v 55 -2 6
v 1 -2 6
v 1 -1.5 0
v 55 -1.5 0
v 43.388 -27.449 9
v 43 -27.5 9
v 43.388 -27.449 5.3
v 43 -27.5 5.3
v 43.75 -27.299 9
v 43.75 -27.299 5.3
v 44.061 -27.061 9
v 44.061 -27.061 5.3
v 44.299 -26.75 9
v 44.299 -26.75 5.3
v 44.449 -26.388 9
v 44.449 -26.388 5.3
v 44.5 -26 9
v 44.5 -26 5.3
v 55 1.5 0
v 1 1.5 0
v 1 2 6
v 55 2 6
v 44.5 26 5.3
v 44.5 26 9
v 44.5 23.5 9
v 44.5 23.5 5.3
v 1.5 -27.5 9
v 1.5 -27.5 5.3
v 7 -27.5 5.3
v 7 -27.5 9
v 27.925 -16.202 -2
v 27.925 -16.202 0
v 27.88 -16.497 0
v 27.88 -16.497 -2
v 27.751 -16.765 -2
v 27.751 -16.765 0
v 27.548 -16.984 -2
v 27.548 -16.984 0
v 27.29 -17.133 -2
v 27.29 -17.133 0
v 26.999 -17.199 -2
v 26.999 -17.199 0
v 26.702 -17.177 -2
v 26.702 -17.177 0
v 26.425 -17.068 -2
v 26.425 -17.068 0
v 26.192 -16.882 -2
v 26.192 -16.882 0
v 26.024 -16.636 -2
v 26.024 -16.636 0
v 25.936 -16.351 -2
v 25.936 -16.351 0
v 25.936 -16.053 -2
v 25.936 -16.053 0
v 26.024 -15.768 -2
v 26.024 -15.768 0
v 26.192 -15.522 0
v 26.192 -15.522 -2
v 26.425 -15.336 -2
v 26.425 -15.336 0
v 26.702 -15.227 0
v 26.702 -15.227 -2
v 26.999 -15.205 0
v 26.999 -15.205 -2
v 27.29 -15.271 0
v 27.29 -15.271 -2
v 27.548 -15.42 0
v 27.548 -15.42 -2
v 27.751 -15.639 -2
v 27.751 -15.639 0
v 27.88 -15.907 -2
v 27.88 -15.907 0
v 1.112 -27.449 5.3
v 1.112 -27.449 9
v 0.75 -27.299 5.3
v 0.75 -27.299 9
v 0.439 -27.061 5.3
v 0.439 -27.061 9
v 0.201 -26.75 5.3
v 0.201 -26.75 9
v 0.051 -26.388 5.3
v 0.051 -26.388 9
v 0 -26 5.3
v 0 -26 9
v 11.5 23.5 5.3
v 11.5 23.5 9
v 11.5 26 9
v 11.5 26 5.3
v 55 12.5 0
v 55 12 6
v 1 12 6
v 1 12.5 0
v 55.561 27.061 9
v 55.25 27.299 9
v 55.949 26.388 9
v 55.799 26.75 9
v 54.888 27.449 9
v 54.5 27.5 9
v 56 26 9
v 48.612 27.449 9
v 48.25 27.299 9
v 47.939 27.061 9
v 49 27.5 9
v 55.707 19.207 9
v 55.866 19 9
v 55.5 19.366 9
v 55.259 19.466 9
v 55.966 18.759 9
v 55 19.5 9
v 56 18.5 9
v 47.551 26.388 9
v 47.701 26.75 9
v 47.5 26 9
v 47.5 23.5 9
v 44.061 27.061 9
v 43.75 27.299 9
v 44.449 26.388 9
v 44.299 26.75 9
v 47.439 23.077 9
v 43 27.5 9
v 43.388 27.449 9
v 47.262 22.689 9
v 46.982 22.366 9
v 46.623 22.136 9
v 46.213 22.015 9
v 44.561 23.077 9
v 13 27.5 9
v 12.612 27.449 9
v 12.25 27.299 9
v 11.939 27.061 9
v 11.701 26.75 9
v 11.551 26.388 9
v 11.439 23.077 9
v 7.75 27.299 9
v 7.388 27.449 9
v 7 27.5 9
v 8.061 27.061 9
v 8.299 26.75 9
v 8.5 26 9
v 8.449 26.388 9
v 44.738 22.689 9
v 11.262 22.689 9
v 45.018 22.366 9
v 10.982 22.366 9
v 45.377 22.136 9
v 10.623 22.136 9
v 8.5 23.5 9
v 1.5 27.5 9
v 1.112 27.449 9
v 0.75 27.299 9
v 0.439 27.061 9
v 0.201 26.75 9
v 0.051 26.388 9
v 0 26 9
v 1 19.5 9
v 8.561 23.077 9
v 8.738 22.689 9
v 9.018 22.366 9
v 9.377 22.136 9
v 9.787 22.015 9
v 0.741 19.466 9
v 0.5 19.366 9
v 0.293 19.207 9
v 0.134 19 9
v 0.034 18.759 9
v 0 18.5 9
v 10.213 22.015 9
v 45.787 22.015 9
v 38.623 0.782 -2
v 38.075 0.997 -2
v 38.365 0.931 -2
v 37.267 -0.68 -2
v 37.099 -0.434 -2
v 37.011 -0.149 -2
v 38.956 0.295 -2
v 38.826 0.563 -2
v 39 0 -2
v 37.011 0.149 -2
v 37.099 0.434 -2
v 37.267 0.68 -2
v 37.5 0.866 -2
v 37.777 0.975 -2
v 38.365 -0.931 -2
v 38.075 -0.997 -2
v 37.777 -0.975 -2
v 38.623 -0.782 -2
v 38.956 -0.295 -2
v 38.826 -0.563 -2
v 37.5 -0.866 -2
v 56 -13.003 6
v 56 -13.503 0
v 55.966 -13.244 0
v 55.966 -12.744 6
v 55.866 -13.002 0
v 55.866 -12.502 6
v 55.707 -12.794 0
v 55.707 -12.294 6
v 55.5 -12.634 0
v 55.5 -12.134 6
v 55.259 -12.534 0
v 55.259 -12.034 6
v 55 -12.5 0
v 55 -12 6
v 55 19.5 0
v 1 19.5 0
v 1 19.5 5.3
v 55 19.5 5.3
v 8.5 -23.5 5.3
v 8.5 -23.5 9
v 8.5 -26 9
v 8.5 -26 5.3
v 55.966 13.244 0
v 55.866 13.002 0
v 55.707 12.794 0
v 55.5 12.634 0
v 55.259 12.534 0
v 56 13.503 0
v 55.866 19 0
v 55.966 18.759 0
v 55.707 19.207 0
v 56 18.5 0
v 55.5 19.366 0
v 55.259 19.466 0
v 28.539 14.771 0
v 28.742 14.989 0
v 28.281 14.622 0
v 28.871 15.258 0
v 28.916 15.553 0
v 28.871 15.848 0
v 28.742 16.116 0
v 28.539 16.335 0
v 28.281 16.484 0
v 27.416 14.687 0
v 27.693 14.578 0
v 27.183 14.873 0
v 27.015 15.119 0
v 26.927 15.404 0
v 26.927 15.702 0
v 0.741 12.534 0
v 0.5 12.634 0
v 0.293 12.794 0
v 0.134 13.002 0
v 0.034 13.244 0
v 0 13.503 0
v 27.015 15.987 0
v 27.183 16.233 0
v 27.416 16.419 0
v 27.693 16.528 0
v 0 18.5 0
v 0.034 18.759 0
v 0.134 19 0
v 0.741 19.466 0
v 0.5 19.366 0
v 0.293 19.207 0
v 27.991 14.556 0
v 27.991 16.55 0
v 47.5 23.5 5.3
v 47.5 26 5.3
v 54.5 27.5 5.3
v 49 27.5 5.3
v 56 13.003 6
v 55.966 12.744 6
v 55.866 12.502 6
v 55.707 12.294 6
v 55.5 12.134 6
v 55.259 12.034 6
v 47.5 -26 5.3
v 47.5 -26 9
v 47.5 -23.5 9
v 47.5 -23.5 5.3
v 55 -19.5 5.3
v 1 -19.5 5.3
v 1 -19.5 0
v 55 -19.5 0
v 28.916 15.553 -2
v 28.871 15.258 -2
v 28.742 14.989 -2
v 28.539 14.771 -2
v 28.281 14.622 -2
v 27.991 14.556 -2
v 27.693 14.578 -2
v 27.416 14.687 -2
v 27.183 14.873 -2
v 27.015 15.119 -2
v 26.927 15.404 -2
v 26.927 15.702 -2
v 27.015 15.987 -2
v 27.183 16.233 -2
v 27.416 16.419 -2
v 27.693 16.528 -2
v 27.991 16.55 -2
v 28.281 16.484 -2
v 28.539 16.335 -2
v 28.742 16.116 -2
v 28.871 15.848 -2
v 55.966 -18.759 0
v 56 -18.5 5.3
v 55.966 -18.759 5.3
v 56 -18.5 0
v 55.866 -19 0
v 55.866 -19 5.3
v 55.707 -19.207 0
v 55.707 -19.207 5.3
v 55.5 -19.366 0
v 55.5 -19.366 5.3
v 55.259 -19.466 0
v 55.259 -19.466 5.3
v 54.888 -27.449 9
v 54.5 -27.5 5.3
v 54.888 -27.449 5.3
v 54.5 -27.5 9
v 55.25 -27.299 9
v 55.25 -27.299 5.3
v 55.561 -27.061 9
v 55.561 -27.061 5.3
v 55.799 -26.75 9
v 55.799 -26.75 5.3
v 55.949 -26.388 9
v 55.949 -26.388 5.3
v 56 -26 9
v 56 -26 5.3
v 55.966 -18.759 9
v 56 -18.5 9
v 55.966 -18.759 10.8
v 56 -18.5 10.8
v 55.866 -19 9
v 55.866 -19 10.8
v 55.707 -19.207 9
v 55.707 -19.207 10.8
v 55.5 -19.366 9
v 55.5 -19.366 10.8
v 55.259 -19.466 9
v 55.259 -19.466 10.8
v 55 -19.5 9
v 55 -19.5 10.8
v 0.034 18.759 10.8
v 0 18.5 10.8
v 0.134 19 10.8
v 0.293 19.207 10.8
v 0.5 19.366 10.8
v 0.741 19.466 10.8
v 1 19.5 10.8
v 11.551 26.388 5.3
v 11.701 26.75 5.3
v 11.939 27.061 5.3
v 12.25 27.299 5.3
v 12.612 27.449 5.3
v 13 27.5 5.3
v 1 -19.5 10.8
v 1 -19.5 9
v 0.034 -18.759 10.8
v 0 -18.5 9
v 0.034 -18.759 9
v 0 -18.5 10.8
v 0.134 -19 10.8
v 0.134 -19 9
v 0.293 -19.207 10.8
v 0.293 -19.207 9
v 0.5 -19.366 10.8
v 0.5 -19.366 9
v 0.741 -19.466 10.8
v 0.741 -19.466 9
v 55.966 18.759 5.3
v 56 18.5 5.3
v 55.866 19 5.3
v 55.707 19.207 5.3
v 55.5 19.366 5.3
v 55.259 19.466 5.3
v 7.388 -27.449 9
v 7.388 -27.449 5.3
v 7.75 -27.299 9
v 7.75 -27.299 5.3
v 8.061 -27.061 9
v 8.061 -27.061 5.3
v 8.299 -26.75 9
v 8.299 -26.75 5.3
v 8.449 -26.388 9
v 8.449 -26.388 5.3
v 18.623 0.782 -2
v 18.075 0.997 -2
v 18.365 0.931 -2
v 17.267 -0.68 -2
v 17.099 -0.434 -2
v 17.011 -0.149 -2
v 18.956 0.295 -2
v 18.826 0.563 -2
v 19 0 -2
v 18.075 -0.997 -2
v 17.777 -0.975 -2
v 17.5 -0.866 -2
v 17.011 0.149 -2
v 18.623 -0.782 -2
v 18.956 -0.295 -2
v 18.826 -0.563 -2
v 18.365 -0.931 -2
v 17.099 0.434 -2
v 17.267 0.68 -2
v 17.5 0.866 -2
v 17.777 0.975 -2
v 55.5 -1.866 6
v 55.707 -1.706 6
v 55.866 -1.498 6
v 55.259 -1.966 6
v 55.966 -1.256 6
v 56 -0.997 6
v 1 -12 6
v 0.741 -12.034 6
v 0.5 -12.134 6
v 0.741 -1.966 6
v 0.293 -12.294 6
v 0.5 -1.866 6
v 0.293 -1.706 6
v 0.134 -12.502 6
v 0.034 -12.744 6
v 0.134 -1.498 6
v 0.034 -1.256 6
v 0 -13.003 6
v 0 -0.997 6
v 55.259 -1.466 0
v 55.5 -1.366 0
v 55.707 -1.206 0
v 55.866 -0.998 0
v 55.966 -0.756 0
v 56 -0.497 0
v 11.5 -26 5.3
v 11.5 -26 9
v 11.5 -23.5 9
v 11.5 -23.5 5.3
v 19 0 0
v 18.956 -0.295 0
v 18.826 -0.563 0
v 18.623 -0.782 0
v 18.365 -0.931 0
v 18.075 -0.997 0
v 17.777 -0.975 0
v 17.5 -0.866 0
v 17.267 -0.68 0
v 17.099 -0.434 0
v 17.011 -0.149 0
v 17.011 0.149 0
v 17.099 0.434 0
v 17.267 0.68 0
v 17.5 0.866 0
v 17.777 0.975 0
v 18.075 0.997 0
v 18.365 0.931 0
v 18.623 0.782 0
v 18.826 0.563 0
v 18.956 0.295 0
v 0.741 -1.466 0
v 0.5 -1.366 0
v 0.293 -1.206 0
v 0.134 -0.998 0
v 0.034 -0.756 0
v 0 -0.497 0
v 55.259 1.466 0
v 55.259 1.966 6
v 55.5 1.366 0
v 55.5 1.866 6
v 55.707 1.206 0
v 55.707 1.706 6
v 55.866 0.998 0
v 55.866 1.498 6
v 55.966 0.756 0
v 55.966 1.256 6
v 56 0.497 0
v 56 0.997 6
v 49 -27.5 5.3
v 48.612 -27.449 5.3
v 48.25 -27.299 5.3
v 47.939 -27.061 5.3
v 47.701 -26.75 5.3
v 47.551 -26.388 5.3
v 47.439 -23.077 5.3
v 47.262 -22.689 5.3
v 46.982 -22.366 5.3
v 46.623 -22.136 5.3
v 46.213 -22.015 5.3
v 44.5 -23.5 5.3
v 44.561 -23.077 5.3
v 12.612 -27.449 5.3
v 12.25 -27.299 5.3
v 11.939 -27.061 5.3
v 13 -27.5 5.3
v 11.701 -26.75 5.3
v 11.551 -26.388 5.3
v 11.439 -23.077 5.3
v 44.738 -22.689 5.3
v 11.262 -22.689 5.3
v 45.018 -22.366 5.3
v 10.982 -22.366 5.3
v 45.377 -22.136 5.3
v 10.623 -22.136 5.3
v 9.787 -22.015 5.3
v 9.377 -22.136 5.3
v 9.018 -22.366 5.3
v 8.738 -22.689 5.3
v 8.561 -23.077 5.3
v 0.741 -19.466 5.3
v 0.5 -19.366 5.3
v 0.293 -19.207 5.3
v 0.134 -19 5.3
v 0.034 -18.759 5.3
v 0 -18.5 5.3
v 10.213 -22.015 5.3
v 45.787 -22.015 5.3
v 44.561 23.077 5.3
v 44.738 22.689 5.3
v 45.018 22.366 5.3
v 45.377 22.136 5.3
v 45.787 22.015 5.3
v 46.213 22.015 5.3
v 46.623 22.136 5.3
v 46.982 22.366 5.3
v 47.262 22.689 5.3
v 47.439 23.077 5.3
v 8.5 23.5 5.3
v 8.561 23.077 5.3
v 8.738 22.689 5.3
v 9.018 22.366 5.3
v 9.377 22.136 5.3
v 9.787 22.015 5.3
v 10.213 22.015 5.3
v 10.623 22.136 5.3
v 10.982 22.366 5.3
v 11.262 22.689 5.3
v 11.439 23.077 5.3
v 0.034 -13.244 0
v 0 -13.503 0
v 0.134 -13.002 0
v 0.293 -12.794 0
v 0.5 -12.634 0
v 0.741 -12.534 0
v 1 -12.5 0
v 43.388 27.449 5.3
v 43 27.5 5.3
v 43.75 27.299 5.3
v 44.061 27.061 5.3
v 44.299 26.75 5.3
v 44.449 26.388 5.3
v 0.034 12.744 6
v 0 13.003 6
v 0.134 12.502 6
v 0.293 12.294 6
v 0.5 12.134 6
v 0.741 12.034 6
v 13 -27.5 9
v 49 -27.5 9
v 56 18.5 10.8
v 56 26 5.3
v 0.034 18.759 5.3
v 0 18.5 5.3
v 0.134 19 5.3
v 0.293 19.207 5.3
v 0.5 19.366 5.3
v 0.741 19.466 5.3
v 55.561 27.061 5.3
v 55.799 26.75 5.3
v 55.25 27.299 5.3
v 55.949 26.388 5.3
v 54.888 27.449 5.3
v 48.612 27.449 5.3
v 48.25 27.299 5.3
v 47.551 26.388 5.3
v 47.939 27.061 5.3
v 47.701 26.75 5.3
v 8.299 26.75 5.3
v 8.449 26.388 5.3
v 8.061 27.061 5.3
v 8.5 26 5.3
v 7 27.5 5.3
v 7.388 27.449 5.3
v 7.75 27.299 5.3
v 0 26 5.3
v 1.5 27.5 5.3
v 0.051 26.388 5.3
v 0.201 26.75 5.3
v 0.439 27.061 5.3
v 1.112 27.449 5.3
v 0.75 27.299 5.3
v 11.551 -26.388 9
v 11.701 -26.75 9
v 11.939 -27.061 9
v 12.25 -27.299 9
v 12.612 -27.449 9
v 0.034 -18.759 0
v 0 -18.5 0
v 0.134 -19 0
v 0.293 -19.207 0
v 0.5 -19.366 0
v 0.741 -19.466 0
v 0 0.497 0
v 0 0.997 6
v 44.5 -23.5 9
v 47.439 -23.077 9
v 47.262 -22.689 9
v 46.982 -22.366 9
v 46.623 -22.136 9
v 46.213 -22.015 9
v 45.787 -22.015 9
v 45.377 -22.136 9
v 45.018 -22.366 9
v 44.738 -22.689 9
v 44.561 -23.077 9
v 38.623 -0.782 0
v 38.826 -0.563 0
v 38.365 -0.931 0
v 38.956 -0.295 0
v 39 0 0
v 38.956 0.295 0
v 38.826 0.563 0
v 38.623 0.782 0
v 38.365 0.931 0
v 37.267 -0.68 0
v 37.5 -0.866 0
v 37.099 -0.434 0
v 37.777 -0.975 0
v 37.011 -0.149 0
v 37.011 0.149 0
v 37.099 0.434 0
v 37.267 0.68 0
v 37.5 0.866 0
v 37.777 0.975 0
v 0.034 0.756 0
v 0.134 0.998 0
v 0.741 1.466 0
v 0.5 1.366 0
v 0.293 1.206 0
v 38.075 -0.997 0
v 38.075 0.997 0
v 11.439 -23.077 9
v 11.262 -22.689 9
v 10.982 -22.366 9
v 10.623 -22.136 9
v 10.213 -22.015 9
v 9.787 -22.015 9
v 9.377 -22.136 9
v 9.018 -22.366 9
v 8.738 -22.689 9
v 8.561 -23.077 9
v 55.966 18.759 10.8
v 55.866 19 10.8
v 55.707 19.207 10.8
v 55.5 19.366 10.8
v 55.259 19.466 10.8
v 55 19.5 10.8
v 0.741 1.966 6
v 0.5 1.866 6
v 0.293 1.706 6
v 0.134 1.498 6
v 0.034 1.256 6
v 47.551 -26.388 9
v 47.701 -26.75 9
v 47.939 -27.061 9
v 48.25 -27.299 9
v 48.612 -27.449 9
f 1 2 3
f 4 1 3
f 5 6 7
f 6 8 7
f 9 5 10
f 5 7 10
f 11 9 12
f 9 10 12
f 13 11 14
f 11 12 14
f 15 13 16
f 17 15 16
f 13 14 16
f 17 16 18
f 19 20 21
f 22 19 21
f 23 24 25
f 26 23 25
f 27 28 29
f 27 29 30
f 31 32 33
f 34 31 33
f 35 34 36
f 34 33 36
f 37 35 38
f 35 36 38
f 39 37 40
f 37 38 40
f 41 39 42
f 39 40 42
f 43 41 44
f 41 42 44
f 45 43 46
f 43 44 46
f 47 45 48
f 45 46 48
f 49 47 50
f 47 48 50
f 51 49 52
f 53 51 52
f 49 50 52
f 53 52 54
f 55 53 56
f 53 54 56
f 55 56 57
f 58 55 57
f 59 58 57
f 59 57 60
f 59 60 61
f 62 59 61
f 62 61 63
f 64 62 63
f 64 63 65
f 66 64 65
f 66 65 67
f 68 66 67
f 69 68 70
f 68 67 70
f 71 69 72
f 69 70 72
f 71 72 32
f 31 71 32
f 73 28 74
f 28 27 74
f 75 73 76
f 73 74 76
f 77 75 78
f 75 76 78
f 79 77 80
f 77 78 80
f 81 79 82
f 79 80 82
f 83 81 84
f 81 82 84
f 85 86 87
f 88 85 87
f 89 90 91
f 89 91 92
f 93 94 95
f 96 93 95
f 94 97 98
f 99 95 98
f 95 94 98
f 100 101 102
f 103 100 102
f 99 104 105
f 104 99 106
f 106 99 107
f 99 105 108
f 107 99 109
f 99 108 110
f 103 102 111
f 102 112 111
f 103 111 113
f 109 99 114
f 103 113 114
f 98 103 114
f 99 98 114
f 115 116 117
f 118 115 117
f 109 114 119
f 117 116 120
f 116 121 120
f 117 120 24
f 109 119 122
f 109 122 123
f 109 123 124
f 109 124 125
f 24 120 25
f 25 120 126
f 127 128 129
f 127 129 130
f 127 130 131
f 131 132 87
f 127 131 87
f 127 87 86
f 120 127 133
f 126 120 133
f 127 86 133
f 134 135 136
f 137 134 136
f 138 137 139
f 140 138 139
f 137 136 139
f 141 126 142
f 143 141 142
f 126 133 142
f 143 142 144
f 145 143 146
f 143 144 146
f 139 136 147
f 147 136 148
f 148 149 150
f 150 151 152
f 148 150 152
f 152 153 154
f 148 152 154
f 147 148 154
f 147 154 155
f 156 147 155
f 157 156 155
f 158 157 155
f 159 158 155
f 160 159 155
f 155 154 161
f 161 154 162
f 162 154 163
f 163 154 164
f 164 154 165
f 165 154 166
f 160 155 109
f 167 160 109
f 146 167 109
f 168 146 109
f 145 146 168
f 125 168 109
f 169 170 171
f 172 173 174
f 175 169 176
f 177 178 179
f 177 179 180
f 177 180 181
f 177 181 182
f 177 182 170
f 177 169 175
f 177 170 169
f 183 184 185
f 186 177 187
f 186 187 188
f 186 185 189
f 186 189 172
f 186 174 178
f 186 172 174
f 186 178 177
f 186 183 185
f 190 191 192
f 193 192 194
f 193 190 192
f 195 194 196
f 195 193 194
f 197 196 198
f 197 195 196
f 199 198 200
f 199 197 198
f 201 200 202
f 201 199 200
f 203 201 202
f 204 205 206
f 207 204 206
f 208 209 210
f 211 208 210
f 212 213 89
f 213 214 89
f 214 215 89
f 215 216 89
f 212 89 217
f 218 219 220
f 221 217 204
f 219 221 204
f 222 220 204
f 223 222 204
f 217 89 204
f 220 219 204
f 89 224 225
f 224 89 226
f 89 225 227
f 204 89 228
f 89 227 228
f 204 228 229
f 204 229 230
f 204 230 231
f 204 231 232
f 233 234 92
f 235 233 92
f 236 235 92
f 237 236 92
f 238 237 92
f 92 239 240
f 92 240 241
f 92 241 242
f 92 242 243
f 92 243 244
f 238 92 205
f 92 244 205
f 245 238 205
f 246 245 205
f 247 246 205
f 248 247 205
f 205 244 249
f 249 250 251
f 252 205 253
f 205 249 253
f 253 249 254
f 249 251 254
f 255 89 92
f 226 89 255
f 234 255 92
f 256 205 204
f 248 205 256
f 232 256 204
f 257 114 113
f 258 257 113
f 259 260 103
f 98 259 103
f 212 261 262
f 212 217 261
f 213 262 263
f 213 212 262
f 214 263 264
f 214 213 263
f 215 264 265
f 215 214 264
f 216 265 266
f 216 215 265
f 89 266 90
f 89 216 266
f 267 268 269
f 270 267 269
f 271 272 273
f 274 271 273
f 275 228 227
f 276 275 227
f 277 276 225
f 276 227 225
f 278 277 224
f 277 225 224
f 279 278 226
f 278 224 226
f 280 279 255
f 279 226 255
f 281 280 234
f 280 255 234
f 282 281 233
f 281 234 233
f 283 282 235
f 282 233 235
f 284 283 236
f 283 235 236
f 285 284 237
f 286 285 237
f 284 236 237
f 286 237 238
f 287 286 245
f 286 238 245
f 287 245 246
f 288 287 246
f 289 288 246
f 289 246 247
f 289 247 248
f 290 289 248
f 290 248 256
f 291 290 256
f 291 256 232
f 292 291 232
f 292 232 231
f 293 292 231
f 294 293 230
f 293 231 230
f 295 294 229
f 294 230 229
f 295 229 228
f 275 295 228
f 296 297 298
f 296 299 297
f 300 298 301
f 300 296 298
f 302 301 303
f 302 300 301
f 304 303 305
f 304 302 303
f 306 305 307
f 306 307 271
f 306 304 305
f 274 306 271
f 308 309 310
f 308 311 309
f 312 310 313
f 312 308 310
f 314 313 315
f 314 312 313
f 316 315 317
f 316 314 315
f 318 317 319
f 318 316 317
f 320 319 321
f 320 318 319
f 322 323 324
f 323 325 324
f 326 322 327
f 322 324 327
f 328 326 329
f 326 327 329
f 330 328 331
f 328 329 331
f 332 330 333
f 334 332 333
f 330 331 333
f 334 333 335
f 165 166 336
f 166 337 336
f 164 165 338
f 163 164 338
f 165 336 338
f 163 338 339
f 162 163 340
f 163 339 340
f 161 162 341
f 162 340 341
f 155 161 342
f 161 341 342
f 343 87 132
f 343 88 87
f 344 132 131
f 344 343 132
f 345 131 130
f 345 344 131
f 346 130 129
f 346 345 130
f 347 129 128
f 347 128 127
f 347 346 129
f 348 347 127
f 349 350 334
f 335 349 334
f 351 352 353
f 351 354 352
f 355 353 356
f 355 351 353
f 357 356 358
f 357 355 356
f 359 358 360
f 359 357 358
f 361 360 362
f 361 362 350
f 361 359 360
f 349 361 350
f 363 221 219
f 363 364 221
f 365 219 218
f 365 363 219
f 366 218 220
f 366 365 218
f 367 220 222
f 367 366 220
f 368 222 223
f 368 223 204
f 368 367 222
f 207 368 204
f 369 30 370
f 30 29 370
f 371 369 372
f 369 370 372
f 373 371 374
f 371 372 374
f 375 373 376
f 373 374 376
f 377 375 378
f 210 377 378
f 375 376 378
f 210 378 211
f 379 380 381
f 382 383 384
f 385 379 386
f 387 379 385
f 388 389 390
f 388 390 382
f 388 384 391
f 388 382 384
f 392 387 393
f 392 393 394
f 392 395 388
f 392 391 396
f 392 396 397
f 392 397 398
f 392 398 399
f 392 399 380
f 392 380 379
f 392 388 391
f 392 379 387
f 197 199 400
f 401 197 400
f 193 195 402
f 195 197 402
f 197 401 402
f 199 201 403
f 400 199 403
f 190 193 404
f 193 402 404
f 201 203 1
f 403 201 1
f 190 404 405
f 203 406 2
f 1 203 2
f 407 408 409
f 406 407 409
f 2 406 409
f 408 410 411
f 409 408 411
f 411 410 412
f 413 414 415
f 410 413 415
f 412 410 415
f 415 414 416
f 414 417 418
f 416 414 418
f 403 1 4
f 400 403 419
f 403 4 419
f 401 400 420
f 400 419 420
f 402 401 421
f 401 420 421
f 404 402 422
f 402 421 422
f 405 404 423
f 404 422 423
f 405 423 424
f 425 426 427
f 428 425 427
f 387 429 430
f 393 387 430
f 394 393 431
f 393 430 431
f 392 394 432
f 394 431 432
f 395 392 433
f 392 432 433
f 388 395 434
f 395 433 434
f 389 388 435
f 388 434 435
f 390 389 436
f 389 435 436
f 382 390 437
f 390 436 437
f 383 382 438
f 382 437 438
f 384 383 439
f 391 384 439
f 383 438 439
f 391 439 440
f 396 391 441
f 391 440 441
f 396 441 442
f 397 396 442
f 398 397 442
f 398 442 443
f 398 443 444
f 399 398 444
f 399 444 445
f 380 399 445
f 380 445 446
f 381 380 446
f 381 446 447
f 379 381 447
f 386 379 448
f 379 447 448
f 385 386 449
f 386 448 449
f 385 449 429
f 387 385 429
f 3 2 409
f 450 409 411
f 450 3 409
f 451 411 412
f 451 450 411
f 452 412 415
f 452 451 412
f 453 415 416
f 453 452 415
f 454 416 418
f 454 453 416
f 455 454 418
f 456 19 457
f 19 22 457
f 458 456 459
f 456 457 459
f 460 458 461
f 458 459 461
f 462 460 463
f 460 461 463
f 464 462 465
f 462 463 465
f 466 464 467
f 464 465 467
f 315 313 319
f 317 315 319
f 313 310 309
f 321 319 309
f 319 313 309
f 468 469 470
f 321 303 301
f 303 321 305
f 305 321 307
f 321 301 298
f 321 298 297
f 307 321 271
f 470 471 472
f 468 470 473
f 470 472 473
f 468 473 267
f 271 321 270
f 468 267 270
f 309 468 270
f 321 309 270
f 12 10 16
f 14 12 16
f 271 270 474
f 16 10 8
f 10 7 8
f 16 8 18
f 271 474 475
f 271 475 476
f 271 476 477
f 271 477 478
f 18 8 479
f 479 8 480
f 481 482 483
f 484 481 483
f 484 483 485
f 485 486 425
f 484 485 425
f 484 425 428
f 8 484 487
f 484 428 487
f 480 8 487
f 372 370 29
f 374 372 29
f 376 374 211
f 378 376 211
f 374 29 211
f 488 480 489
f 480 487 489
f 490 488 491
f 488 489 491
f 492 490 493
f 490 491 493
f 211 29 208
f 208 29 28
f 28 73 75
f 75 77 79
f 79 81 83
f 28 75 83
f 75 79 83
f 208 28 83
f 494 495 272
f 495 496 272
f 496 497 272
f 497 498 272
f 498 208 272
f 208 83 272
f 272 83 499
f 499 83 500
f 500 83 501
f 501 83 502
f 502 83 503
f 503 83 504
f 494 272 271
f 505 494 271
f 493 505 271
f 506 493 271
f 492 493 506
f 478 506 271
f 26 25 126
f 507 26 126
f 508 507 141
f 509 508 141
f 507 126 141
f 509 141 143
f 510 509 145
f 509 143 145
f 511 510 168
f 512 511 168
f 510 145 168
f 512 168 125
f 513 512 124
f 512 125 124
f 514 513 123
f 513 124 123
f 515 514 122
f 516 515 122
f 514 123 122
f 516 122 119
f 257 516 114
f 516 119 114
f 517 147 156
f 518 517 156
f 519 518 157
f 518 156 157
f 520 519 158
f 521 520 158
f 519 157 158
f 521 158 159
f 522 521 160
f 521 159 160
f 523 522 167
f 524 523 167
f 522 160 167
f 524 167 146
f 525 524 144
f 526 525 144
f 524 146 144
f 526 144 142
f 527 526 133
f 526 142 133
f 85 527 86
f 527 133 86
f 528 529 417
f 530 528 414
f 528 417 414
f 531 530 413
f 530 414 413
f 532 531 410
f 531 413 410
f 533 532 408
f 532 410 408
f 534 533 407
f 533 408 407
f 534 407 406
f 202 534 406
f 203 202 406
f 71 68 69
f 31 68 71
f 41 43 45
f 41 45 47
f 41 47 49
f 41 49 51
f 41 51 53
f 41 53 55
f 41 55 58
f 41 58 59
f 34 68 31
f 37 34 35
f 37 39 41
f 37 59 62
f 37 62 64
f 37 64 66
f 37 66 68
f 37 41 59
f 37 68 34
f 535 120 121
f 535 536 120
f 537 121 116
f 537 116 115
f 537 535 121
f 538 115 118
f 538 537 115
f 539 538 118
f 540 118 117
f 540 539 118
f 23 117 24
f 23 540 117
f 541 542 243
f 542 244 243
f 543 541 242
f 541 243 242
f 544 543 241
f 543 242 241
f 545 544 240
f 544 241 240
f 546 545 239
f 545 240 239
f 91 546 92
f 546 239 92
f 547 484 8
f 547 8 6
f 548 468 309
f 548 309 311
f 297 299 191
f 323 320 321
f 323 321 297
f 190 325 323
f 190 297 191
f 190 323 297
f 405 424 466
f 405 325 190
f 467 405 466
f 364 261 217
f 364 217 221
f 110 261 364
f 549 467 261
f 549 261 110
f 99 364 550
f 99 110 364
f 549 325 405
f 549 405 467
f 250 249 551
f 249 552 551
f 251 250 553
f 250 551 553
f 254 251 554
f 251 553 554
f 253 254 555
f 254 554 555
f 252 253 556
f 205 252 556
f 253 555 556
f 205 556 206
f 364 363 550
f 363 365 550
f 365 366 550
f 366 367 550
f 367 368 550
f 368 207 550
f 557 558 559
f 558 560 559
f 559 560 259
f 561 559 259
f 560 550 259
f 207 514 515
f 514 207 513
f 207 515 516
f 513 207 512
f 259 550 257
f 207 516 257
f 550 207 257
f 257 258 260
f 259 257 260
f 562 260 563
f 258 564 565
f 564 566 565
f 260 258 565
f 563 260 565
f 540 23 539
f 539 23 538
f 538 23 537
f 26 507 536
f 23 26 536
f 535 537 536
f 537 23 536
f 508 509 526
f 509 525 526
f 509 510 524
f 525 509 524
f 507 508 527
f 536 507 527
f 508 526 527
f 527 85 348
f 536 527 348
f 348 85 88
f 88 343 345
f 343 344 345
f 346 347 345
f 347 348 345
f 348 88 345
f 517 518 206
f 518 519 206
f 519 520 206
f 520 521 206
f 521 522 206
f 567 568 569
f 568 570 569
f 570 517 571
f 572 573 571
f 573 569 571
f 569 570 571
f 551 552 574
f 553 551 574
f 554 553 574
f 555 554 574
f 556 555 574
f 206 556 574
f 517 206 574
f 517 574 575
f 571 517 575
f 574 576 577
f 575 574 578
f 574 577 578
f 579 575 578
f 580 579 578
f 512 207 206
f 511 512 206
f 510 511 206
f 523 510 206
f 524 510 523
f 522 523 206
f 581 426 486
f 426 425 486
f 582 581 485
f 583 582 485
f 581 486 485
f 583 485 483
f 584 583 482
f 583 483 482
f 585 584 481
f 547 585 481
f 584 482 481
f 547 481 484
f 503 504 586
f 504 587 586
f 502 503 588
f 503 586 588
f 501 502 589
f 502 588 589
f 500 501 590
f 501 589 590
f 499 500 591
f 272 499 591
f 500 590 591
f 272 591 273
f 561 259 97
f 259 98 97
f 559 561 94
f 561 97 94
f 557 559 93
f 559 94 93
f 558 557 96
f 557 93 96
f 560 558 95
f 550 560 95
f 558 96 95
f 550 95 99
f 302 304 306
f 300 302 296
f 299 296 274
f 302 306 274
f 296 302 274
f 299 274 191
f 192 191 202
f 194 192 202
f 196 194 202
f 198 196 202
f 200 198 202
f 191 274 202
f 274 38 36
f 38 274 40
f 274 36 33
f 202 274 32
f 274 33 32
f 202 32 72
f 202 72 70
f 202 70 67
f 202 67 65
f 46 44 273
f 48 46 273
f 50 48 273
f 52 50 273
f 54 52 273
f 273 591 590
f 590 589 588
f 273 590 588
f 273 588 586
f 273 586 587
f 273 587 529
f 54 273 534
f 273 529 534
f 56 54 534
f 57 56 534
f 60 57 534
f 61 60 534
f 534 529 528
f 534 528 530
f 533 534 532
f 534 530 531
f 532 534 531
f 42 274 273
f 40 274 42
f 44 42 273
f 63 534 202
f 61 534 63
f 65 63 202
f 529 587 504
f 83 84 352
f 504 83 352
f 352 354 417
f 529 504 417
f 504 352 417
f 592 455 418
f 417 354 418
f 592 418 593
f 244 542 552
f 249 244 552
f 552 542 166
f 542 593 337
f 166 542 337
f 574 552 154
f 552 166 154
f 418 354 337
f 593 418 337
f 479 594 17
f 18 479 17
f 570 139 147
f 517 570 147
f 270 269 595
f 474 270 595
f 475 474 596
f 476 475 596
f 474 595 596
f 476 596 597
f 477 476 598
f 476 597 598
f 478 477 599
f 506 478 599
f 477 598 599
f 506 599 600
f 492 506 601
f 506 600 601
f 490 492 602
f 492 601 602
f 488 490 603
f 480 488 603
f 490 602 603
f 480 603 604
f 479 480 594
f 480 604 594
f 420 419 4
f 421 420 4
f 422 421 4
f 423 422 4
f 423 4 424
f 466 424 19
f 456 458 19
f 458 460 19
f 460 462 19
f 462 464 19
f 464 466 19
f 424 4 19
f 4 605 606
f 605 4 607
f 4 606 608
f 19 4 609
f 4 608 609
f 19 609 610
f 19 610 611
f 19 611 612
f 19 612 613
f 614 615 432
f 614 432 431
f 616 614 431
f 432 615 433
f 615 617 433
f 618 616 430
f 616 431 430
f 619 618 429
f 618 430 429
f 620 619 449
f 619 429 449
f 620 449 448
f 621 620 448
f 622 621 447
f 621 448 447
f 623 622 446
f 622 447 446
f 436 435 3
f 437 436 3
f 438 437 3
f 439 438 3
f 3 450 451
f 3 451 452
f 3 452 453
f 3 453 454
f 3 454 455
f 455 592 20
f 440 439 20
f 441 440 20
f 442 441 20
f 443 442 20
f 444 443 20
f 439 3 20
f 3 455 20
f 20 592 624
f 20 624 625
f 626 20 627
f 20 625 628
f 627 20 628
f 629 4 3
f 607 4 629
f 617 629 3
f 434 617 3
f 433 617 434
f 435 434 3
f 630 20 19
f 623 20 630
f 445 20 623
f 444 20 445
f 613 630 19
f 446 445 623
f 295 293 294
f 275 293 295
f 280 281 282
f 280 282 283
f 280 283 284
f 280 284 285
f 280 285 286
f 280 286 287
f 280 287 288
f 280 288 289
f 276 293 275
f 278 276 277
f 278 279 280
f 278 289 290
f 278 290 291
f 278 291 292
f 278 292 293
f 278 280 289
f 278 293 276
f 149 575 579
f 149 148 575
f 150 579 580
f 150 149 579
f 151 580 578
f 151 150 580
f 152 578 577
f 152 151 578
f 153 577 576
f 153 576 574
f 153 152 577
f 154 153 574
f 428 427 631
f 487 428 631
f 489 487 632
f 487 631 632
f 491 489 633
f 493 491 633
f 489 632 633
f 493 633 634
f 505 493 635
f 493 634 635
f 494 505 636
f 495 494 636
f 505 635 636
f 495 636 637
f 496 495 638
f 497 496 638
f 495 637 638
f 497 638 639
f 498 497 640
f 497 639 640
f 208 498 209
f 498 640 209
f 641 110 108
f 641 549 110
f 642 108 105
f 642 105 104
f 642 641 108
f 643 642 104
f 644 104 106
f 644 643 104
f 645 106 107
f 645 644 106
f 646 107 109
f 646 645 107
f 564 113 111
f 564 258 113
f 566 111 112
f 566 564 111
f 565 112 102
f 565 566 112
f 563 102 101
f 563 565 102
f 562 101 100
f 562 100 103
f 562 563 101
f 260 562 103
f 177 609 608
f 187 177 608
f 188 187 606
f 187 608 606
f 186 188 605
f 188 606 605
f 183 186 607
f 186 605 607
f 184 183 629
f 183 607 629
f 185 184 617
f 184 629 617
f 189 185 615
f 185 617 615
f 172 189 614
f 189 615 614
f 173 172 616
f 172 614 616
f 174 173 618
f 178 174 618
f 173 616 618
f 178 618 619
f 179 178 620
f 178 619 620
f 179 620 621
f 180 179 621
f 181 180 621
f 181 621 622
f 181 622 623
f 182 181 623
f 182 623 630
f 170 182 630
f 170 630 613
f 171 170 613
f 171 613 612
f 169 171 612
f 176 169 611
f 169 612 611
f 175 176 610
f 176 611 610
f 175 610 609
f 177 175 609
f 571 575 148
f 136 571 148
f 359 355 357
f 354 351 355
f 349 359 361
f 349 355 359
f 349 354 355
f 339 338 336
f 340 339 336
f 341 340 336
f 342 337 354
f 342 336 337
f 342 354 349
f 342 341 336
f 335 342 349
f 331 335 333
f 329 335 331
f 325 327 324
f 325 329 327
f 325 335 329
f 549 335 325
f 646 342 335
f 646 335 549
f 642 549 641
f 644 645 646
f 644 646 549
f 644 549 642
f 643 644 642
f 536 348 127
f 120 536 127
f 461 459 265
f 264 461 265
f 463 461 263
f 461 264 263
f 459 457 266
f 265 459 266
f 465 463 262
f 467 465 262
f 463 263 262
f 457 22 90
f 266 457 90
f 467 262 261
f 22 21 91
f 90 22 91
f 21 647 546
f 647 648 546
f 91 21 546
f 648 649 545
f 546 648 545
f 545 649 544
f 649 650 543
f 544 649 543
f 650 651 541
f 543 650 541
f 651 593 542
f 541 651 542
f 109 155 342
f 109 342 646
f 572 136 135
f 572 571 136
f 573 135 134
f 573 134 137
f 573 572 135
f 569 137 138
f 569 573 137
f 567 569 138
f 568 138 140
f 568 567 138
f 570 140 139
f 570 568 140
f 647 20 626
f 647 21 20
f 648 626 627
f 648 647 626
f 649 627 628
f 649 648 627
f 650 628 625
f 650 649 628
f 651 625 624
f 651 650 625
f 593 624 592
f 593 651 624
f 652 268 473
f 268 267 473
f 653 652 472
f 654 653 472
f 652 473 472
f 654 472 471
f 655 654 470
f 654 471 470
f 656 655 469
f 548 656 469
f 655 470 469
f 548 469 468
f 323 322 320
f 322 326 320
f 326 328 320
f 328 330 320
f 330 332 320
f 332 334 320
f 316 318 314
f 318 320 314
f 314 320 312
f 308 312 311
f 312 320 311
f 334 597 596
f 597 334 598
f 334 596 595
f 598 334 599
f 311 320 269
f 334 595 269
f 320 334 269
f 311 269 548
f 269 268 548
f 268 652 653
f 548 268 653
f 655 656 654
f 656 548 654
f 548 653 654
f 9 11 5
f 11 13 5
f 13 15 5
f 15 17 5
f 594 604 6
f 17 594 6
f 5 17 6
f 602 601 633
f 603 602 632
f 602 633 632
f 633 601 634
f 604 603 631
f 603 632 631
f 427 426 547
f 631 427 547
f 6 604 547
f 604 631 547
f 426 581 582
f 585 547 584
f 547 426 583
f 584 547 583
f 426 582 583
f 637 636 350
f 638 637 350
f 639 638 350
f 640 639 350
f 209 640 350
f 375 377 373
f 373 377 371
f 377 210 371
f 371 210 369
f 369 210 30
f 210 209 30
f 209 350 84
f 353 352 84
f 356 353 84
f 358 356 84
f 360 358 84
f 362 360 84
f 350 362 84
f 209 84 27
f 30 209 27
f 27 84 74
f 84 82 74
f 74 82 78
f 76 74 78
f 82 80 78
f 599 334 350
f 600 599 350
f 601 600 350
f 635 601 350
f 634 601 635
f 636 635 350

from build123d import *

# Parameters (mm, degrees)
F0_W     = 8
F0_H     = 3.7
F1_DEPTH = 56
F3_W     = 56
F3_H     = 39
F4_DEPTH = 1.8
F5_DEPTH = 25
F6_R     = 1
F7_R     = 1.5
F8_R     = 1
F9_DEPTH = 2


with BuildPart() as f1:
    # F0 (on Right) → F1 (new body)
    with BuildSketch(Plane.YZ):
        Polygon((-1.5, 0), (0, 0), (0, 9), (-19.5, 9), (-19.5, 5.3), (-19.5, 0), (-12.5, 0), (-12, 6), (-2, 6), align=None)
        with Locations((-23.5, 7.15)):
            Rectangle(F0_W, F0_H)
        Polygon((0, 9), (0, 0), (1.5, 0), (2, 6), (12, 6), (12.5, 0), (19.5, 0), (19.5, 5.3), (19.5, 9), align=None)
        with Locations((23.5, 7.15)):
            Rectangle(F0_W, F0_H)
    extrude(amount=F1_DEPTH)

    # F3 (on face) → F4 (join)
    with BuildSketch(Plane.XY.offset(9)):
        with Locations((28, 0)):
            Rectangle(F3_W, F3_H)
    extrude(amount=F4_DEPTH)

    # F2 (on face) → F5 (cut)
    with BuildSketch(Plane.XY.offset(9)):
        with BuildLine():
            Line((11.5, -27.5), (11.5, -23.5))
            ThreePointArc((11.5, -23.5), (10, -25), (8.5, -23.5))
            Line((8.5, -23.5), (8.5, -27.5))
            Line((8.5, -27.5), (11.5, -27.5))
        make_face()
        with BuildLine():
            ThreePointArc((8.5, -23.5), (10, -25), (11.5, -23.5))
            ThreePointArc((11.5, -23.5), (10, -22), (8.5, -23.5))
        make_face()
        with BuildLine():
            Line((44.5, -23.5), (44.5, -27.5))
            Line((44.5, -27.5), (47.5, -27.5))
            Line((47.5, -27.5), (47.5, -23.5))
            ThreePointArc((47.5, -23.5), (46, -25), (44.5, -23.5))
        make_face()
        with BuildLine():
            ThreePointArc((47.5, -23.5), (46, -22), (44.5, -23.5))
            ThreePointArc((44.5, -23.5), (46, -25), (47.5, -23.5))
        make_face()
        with BuildLine():
            Line((11.5, 27.5), (8.5, 27.5))
            Line((8.5, 27.5), (8.5, 23.5))
            ThreePointArc((8.5, 23.5), (10, 25), (11.5, 23.5))
            Line((11.5, 23.5), (11.5, 27.5))
        make_face()
        with BuildLine():
            ThreePointArc((11.5, 23.5), (10, 25), (8.5, 23.5))
            ThreePointArc((8.5, 23.5), (10, 22), (11.5, 23.5))
        make_face()
        with BuildLine():
            ThreePointArc((44.5, 23.5), (46, 22), (47.5, 23.5))
            ThreePointArc((47.5, 23.5), (46, 25), (44.5, 23.5))
        make_face()
        with BuildLine():
            Line((47.5, 23.5), (47.5, 27.5))
            Line((47.5, 27.5), (44.5, 27.5))
            Line((44.5, 27.5), (44.5, 23.5))
            ThreePointArc((44.5, 23.5), (46, 25), (47.5, 23.5))
        make_face()
    extrude(amount=-F5_DEPTH, mode=Mode.SUBTRACT)

    # F6
    f6_edges = [f1.edges().sort_by_distance(p)[0] for p in [
        (56, 19.5, 2.65),
        (56, 12.25, 3),
        (56, 1.75, 3),
        (56, -1.75, 3),
        (56, -12.25, 3),
        (56, -19.5, 2.65),
        (56, 19.5, 9.9),
        (56, -19.5, 9.9),
        (0, 19.5, 2.65),
        (0, 12.25, 3),
        (0, 1.75, 3),
        (0, -1.75, 3),
        (0, 19.5, 9.9),
        (0, -12.25, 3),
        (0, -19.5, 2.65),
        (0, -19.5, 9.9),
    ]]
    fillet(f6_edges, radius=F6_R)

    # F7
    f7_edges = [f1.edges().sort_by_distance(p)[0] for p in [
        (0, -27.5, 7.15),
        (8.5, -27.5, 7.15),
        (11.5, -27.5, 7.15),
        (47.5, -27.5, 7.15),
        (44.5, -27.5, 7.15),
        (56, -27.5, 7.15),
        (0, 27.5, 7.15),
        (8.5, 27.5, 7.15),
        (11.5, 27.5, 7.15),
        (44.5, 27.5, 7.15),
        (47.5, 27.5, 7.15),
        (56, 27.5, 7.15),
    ]]
    fillet(f7_edges, radius=F7_R)

    # F8 (on face) → F9 (join)
    with BuildSketch(Plane(origin=(0, 0, 0), x_dir=(1, 0, 0), z_dir=(0, 0, -1))):
        with Locations((38, 0)):
            Circle(F8_R)
        with Locations((18, 0)):
            Circle(F8_R)
        with Locations((26.9247623258, 16.2018900485)):
            Circle(F8_R)
        with Locations((27.9158912599, -15.5527964234)):
            Circle(F8_R)
    extrude(amount=F9_DEPTH)


solid = f1.part
